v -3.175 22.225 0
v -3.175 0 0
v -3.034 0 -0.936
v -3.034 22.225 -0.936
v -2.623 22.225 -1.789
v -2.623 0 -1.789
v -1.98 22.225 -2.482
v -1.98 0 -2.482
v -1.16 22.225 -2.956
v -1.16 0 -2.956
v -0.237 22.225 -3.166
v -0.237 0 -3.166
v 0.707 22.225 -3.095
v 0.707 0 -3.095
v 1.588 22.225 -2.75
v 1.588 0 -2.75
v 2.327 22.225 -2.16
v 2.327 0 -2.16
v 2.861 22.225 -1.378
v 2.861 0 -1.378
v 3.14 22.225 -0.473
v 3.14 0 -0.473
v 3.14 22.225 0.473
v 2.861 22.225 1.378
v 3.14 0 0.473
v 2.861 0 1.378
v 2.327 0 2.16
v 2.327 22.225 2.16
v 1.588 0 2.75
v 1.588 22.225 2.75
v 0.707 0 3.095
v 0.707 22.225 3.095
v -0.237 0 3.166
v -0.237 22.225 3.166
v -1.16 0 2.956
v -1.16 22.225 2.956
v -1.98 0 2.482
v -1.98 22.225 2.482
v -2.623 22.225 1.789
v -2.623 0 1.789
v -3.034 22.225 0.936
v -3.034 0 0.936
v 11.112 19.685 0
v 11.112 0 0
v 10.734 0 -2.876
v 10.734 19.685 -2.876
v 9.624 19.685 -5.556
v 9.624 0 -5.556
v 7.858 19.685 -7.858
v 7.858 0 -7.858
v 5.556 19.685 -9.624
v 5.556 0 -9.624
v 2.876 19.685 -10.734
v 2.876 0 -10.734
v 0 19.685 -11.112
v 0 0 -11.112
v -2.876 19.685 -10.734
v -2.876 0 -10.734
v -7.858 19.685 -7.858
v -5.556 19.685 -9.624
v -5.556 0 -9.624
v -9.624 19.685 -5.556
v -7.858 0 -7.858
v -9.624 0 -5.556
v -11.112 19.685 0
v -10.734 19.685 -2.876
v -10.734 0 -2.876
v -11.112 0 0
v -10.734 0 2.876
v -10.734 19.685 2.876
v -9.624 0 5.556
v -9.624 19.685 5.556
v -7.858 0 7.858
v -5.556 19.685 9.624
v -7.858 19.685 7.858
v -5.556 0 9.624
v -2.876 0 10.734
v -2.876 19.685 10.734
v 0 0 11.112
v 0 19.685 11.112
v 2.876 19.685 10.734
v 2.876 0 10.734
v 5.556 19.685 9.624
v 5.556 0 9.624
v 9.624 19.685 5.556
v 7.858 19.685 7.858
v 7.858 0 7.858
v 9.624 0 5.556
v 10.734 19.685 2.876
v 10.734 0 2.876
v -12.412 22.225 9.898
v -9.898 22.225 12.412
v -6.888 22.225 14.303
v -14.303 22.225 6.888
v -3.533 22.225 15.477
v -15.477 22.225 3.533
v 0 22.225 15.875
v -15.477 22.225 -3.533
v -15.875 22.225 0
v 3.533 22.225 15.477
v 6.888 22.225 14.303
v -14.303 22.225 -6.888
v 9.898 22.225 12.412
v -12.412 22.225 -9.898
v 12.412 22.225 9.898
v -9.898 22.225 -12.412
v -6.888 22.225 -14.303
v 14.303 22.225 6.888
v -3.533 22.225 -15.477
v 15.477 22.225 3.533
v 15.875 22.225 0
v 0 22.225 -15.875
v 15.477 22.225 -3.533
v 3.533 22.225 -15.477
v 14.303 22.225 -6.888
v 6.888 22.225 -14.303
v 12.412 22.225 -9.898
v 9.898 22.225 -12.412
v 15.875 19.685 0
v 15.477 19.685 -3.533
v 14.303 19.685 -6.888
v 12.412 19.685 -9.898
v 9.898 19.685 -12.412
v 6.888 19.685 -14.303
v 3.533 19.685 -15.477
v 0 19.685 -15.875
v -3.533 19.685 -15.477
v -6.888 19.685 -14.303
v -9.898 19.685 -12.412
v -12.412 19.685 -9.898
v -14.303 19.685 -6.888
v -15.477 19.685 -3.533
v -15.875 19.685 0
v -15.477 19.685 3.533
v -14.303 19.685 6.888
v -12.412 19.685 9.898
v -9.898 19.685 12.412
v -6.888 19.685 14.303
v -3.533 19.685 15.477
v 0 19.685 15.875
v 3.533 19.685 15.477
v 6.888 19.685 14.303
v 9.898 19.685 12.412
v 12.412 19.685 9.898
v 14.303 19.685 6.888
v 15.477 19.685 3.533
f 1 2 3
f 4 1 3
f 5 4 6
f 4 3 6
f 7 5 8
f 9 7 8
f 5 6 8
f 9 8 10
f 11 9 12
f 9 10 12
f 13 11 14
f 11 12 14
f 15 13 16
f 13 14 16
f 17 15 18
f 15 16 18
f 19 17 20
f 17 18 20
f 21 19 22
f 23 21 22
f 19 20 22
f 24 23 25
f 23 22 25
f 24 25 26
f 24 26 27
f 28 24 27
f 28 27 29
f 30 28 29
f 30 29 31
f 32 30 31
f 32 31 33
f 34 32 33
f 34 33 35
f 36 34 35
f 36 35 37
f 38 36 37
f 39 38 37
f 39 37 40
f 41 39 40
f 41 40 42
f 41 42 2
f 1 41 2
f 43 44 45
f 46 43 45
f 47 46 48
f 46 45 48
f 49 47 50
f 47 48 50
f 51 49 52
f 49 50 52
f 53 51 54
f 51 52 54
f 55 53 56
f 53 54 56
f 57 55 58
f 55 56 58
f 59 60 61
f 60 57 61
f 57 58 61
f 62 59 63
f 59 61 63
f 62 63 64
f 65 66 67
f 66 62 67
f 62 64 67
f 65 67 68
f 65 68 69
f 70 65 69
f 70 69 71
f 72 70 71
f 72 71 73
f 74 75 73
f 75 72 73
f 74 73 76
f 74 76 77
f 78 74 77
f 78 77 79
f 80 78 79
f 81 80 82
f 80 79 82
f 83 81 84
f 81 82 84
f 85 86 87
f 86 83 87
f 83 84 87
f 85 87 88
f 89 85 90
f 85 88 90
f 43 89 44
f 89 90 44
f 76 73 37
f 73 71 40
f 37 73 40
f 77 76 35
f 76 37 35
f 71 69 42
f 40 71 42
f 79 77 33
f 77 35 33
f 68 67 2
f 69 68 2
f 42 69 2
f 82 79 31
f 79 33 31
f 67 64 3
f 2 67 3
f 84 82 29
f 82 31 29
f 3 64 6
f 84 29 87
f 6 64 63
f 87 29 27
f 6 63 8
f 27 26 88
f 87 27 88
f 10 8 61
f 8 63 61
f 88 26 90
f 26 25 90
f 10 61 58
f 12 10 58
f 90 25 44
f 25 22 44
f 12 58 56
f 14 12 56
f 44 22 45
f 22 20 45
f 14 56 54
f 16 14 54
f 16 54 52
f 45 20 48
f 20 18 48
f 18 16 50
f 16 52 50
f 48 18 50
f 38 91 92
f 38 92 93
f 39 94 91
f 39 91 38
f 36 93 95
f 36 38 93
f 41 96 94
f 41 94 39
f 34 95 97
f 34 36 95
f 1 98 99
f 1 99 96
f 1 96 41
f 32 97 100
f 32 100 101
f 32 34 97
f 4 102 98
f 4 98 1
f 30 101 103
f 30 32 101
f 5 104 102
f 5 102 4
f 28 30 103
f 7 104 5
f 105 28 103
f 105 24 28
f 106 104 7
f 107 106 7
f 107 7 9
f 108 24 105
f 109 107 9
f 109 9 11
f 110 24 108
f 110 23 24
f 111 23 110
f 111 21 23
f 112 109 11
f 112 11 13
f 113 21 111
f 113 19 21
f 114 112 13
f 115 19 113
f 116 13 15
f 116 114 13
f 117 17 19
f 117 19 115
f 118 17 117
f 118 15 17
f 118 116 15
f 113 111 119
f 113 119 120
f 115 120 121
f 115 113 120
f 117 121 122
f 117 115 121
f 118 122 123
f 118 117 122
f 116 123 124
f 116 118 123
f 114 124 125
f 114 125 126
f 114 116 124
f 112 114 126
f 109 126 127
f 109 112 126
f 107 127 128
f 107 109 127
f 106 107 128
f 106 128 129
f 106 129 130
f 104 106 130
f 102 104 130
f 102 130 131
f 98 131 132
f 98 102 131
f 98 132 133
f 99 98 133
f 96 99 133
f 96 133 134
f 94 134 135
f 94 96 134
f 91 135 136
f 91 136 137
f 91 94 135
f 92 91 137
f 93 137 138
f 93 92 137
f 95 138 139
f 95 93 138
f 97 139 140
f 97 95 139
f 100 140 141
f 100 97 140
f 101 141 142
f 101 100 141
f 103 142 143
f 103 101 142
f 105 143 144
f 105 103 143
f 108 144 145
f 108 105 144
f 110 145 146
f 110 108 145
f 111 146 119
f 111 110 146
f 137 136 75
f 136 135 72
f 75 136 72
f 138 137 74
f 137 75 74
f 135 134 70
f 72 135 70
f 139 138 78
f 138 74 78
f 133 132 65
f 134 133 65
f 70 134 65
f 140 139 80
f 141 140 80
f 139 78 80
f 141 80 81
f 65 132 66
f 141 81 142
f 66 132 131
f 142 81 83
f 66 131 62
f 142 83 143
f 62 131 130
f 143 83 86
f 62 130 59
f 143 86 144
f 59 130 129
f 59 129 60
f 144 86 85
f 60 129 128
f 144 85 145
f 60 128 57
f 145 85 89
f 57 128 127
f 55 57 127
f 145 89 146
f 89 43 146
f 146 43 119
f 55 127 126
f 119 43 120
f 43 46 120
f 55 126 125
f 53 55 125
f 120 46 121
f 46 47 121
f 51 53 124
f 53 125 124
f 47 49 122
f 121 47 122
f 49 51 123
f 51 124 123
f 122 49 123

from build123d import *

# Parameters (mm, degrees)
SKETCH1_R                   = 11.1125
BOSS_EXTRUDE1_DEPTH         = 22.225
SKETCH2_R                   = 15.875
BOSS_EXTRUDE2_DEPTH         = 2.54
F_1_4_0_25_DIAMETER_HOLE1_D = 6.35


with BuildPart() as part:
    # Sketch1 → Boss-Extrude1 (new body)
    with BuildSketch(Plane(origin=(0, 0, 0), x_dir=(1, 0, 0), z_dir=(0, 1, 0))):
        Circle(SKETCH1_R)
    extrude(amount=BOSS_EXTRUDE1_DEPTH)

    # Sketch2 → Boss-Extrude2 (add)
    with BuildSketch(Plane(origin=(0, 22.225, 0), x_dir=(1, 0, 0), z_dir=(0, 1, 0))):
        Circle(SKETCH2_R)
    extrude(amount=-BOSS_EXTRUDE2_DEPTH)

    # 1/4 (0.25) Diameter Hole1 (through all)
    with Locations(Plane(origin=(0, 22.225, 0), x_dir=(1, 0, 0), z_dir=(0, 1, 0))):
        with Locations((0, 0)):
            Hole(F_1_4_0_25_DIAMETER_HOLE1_D / 2)


solid = part.part
